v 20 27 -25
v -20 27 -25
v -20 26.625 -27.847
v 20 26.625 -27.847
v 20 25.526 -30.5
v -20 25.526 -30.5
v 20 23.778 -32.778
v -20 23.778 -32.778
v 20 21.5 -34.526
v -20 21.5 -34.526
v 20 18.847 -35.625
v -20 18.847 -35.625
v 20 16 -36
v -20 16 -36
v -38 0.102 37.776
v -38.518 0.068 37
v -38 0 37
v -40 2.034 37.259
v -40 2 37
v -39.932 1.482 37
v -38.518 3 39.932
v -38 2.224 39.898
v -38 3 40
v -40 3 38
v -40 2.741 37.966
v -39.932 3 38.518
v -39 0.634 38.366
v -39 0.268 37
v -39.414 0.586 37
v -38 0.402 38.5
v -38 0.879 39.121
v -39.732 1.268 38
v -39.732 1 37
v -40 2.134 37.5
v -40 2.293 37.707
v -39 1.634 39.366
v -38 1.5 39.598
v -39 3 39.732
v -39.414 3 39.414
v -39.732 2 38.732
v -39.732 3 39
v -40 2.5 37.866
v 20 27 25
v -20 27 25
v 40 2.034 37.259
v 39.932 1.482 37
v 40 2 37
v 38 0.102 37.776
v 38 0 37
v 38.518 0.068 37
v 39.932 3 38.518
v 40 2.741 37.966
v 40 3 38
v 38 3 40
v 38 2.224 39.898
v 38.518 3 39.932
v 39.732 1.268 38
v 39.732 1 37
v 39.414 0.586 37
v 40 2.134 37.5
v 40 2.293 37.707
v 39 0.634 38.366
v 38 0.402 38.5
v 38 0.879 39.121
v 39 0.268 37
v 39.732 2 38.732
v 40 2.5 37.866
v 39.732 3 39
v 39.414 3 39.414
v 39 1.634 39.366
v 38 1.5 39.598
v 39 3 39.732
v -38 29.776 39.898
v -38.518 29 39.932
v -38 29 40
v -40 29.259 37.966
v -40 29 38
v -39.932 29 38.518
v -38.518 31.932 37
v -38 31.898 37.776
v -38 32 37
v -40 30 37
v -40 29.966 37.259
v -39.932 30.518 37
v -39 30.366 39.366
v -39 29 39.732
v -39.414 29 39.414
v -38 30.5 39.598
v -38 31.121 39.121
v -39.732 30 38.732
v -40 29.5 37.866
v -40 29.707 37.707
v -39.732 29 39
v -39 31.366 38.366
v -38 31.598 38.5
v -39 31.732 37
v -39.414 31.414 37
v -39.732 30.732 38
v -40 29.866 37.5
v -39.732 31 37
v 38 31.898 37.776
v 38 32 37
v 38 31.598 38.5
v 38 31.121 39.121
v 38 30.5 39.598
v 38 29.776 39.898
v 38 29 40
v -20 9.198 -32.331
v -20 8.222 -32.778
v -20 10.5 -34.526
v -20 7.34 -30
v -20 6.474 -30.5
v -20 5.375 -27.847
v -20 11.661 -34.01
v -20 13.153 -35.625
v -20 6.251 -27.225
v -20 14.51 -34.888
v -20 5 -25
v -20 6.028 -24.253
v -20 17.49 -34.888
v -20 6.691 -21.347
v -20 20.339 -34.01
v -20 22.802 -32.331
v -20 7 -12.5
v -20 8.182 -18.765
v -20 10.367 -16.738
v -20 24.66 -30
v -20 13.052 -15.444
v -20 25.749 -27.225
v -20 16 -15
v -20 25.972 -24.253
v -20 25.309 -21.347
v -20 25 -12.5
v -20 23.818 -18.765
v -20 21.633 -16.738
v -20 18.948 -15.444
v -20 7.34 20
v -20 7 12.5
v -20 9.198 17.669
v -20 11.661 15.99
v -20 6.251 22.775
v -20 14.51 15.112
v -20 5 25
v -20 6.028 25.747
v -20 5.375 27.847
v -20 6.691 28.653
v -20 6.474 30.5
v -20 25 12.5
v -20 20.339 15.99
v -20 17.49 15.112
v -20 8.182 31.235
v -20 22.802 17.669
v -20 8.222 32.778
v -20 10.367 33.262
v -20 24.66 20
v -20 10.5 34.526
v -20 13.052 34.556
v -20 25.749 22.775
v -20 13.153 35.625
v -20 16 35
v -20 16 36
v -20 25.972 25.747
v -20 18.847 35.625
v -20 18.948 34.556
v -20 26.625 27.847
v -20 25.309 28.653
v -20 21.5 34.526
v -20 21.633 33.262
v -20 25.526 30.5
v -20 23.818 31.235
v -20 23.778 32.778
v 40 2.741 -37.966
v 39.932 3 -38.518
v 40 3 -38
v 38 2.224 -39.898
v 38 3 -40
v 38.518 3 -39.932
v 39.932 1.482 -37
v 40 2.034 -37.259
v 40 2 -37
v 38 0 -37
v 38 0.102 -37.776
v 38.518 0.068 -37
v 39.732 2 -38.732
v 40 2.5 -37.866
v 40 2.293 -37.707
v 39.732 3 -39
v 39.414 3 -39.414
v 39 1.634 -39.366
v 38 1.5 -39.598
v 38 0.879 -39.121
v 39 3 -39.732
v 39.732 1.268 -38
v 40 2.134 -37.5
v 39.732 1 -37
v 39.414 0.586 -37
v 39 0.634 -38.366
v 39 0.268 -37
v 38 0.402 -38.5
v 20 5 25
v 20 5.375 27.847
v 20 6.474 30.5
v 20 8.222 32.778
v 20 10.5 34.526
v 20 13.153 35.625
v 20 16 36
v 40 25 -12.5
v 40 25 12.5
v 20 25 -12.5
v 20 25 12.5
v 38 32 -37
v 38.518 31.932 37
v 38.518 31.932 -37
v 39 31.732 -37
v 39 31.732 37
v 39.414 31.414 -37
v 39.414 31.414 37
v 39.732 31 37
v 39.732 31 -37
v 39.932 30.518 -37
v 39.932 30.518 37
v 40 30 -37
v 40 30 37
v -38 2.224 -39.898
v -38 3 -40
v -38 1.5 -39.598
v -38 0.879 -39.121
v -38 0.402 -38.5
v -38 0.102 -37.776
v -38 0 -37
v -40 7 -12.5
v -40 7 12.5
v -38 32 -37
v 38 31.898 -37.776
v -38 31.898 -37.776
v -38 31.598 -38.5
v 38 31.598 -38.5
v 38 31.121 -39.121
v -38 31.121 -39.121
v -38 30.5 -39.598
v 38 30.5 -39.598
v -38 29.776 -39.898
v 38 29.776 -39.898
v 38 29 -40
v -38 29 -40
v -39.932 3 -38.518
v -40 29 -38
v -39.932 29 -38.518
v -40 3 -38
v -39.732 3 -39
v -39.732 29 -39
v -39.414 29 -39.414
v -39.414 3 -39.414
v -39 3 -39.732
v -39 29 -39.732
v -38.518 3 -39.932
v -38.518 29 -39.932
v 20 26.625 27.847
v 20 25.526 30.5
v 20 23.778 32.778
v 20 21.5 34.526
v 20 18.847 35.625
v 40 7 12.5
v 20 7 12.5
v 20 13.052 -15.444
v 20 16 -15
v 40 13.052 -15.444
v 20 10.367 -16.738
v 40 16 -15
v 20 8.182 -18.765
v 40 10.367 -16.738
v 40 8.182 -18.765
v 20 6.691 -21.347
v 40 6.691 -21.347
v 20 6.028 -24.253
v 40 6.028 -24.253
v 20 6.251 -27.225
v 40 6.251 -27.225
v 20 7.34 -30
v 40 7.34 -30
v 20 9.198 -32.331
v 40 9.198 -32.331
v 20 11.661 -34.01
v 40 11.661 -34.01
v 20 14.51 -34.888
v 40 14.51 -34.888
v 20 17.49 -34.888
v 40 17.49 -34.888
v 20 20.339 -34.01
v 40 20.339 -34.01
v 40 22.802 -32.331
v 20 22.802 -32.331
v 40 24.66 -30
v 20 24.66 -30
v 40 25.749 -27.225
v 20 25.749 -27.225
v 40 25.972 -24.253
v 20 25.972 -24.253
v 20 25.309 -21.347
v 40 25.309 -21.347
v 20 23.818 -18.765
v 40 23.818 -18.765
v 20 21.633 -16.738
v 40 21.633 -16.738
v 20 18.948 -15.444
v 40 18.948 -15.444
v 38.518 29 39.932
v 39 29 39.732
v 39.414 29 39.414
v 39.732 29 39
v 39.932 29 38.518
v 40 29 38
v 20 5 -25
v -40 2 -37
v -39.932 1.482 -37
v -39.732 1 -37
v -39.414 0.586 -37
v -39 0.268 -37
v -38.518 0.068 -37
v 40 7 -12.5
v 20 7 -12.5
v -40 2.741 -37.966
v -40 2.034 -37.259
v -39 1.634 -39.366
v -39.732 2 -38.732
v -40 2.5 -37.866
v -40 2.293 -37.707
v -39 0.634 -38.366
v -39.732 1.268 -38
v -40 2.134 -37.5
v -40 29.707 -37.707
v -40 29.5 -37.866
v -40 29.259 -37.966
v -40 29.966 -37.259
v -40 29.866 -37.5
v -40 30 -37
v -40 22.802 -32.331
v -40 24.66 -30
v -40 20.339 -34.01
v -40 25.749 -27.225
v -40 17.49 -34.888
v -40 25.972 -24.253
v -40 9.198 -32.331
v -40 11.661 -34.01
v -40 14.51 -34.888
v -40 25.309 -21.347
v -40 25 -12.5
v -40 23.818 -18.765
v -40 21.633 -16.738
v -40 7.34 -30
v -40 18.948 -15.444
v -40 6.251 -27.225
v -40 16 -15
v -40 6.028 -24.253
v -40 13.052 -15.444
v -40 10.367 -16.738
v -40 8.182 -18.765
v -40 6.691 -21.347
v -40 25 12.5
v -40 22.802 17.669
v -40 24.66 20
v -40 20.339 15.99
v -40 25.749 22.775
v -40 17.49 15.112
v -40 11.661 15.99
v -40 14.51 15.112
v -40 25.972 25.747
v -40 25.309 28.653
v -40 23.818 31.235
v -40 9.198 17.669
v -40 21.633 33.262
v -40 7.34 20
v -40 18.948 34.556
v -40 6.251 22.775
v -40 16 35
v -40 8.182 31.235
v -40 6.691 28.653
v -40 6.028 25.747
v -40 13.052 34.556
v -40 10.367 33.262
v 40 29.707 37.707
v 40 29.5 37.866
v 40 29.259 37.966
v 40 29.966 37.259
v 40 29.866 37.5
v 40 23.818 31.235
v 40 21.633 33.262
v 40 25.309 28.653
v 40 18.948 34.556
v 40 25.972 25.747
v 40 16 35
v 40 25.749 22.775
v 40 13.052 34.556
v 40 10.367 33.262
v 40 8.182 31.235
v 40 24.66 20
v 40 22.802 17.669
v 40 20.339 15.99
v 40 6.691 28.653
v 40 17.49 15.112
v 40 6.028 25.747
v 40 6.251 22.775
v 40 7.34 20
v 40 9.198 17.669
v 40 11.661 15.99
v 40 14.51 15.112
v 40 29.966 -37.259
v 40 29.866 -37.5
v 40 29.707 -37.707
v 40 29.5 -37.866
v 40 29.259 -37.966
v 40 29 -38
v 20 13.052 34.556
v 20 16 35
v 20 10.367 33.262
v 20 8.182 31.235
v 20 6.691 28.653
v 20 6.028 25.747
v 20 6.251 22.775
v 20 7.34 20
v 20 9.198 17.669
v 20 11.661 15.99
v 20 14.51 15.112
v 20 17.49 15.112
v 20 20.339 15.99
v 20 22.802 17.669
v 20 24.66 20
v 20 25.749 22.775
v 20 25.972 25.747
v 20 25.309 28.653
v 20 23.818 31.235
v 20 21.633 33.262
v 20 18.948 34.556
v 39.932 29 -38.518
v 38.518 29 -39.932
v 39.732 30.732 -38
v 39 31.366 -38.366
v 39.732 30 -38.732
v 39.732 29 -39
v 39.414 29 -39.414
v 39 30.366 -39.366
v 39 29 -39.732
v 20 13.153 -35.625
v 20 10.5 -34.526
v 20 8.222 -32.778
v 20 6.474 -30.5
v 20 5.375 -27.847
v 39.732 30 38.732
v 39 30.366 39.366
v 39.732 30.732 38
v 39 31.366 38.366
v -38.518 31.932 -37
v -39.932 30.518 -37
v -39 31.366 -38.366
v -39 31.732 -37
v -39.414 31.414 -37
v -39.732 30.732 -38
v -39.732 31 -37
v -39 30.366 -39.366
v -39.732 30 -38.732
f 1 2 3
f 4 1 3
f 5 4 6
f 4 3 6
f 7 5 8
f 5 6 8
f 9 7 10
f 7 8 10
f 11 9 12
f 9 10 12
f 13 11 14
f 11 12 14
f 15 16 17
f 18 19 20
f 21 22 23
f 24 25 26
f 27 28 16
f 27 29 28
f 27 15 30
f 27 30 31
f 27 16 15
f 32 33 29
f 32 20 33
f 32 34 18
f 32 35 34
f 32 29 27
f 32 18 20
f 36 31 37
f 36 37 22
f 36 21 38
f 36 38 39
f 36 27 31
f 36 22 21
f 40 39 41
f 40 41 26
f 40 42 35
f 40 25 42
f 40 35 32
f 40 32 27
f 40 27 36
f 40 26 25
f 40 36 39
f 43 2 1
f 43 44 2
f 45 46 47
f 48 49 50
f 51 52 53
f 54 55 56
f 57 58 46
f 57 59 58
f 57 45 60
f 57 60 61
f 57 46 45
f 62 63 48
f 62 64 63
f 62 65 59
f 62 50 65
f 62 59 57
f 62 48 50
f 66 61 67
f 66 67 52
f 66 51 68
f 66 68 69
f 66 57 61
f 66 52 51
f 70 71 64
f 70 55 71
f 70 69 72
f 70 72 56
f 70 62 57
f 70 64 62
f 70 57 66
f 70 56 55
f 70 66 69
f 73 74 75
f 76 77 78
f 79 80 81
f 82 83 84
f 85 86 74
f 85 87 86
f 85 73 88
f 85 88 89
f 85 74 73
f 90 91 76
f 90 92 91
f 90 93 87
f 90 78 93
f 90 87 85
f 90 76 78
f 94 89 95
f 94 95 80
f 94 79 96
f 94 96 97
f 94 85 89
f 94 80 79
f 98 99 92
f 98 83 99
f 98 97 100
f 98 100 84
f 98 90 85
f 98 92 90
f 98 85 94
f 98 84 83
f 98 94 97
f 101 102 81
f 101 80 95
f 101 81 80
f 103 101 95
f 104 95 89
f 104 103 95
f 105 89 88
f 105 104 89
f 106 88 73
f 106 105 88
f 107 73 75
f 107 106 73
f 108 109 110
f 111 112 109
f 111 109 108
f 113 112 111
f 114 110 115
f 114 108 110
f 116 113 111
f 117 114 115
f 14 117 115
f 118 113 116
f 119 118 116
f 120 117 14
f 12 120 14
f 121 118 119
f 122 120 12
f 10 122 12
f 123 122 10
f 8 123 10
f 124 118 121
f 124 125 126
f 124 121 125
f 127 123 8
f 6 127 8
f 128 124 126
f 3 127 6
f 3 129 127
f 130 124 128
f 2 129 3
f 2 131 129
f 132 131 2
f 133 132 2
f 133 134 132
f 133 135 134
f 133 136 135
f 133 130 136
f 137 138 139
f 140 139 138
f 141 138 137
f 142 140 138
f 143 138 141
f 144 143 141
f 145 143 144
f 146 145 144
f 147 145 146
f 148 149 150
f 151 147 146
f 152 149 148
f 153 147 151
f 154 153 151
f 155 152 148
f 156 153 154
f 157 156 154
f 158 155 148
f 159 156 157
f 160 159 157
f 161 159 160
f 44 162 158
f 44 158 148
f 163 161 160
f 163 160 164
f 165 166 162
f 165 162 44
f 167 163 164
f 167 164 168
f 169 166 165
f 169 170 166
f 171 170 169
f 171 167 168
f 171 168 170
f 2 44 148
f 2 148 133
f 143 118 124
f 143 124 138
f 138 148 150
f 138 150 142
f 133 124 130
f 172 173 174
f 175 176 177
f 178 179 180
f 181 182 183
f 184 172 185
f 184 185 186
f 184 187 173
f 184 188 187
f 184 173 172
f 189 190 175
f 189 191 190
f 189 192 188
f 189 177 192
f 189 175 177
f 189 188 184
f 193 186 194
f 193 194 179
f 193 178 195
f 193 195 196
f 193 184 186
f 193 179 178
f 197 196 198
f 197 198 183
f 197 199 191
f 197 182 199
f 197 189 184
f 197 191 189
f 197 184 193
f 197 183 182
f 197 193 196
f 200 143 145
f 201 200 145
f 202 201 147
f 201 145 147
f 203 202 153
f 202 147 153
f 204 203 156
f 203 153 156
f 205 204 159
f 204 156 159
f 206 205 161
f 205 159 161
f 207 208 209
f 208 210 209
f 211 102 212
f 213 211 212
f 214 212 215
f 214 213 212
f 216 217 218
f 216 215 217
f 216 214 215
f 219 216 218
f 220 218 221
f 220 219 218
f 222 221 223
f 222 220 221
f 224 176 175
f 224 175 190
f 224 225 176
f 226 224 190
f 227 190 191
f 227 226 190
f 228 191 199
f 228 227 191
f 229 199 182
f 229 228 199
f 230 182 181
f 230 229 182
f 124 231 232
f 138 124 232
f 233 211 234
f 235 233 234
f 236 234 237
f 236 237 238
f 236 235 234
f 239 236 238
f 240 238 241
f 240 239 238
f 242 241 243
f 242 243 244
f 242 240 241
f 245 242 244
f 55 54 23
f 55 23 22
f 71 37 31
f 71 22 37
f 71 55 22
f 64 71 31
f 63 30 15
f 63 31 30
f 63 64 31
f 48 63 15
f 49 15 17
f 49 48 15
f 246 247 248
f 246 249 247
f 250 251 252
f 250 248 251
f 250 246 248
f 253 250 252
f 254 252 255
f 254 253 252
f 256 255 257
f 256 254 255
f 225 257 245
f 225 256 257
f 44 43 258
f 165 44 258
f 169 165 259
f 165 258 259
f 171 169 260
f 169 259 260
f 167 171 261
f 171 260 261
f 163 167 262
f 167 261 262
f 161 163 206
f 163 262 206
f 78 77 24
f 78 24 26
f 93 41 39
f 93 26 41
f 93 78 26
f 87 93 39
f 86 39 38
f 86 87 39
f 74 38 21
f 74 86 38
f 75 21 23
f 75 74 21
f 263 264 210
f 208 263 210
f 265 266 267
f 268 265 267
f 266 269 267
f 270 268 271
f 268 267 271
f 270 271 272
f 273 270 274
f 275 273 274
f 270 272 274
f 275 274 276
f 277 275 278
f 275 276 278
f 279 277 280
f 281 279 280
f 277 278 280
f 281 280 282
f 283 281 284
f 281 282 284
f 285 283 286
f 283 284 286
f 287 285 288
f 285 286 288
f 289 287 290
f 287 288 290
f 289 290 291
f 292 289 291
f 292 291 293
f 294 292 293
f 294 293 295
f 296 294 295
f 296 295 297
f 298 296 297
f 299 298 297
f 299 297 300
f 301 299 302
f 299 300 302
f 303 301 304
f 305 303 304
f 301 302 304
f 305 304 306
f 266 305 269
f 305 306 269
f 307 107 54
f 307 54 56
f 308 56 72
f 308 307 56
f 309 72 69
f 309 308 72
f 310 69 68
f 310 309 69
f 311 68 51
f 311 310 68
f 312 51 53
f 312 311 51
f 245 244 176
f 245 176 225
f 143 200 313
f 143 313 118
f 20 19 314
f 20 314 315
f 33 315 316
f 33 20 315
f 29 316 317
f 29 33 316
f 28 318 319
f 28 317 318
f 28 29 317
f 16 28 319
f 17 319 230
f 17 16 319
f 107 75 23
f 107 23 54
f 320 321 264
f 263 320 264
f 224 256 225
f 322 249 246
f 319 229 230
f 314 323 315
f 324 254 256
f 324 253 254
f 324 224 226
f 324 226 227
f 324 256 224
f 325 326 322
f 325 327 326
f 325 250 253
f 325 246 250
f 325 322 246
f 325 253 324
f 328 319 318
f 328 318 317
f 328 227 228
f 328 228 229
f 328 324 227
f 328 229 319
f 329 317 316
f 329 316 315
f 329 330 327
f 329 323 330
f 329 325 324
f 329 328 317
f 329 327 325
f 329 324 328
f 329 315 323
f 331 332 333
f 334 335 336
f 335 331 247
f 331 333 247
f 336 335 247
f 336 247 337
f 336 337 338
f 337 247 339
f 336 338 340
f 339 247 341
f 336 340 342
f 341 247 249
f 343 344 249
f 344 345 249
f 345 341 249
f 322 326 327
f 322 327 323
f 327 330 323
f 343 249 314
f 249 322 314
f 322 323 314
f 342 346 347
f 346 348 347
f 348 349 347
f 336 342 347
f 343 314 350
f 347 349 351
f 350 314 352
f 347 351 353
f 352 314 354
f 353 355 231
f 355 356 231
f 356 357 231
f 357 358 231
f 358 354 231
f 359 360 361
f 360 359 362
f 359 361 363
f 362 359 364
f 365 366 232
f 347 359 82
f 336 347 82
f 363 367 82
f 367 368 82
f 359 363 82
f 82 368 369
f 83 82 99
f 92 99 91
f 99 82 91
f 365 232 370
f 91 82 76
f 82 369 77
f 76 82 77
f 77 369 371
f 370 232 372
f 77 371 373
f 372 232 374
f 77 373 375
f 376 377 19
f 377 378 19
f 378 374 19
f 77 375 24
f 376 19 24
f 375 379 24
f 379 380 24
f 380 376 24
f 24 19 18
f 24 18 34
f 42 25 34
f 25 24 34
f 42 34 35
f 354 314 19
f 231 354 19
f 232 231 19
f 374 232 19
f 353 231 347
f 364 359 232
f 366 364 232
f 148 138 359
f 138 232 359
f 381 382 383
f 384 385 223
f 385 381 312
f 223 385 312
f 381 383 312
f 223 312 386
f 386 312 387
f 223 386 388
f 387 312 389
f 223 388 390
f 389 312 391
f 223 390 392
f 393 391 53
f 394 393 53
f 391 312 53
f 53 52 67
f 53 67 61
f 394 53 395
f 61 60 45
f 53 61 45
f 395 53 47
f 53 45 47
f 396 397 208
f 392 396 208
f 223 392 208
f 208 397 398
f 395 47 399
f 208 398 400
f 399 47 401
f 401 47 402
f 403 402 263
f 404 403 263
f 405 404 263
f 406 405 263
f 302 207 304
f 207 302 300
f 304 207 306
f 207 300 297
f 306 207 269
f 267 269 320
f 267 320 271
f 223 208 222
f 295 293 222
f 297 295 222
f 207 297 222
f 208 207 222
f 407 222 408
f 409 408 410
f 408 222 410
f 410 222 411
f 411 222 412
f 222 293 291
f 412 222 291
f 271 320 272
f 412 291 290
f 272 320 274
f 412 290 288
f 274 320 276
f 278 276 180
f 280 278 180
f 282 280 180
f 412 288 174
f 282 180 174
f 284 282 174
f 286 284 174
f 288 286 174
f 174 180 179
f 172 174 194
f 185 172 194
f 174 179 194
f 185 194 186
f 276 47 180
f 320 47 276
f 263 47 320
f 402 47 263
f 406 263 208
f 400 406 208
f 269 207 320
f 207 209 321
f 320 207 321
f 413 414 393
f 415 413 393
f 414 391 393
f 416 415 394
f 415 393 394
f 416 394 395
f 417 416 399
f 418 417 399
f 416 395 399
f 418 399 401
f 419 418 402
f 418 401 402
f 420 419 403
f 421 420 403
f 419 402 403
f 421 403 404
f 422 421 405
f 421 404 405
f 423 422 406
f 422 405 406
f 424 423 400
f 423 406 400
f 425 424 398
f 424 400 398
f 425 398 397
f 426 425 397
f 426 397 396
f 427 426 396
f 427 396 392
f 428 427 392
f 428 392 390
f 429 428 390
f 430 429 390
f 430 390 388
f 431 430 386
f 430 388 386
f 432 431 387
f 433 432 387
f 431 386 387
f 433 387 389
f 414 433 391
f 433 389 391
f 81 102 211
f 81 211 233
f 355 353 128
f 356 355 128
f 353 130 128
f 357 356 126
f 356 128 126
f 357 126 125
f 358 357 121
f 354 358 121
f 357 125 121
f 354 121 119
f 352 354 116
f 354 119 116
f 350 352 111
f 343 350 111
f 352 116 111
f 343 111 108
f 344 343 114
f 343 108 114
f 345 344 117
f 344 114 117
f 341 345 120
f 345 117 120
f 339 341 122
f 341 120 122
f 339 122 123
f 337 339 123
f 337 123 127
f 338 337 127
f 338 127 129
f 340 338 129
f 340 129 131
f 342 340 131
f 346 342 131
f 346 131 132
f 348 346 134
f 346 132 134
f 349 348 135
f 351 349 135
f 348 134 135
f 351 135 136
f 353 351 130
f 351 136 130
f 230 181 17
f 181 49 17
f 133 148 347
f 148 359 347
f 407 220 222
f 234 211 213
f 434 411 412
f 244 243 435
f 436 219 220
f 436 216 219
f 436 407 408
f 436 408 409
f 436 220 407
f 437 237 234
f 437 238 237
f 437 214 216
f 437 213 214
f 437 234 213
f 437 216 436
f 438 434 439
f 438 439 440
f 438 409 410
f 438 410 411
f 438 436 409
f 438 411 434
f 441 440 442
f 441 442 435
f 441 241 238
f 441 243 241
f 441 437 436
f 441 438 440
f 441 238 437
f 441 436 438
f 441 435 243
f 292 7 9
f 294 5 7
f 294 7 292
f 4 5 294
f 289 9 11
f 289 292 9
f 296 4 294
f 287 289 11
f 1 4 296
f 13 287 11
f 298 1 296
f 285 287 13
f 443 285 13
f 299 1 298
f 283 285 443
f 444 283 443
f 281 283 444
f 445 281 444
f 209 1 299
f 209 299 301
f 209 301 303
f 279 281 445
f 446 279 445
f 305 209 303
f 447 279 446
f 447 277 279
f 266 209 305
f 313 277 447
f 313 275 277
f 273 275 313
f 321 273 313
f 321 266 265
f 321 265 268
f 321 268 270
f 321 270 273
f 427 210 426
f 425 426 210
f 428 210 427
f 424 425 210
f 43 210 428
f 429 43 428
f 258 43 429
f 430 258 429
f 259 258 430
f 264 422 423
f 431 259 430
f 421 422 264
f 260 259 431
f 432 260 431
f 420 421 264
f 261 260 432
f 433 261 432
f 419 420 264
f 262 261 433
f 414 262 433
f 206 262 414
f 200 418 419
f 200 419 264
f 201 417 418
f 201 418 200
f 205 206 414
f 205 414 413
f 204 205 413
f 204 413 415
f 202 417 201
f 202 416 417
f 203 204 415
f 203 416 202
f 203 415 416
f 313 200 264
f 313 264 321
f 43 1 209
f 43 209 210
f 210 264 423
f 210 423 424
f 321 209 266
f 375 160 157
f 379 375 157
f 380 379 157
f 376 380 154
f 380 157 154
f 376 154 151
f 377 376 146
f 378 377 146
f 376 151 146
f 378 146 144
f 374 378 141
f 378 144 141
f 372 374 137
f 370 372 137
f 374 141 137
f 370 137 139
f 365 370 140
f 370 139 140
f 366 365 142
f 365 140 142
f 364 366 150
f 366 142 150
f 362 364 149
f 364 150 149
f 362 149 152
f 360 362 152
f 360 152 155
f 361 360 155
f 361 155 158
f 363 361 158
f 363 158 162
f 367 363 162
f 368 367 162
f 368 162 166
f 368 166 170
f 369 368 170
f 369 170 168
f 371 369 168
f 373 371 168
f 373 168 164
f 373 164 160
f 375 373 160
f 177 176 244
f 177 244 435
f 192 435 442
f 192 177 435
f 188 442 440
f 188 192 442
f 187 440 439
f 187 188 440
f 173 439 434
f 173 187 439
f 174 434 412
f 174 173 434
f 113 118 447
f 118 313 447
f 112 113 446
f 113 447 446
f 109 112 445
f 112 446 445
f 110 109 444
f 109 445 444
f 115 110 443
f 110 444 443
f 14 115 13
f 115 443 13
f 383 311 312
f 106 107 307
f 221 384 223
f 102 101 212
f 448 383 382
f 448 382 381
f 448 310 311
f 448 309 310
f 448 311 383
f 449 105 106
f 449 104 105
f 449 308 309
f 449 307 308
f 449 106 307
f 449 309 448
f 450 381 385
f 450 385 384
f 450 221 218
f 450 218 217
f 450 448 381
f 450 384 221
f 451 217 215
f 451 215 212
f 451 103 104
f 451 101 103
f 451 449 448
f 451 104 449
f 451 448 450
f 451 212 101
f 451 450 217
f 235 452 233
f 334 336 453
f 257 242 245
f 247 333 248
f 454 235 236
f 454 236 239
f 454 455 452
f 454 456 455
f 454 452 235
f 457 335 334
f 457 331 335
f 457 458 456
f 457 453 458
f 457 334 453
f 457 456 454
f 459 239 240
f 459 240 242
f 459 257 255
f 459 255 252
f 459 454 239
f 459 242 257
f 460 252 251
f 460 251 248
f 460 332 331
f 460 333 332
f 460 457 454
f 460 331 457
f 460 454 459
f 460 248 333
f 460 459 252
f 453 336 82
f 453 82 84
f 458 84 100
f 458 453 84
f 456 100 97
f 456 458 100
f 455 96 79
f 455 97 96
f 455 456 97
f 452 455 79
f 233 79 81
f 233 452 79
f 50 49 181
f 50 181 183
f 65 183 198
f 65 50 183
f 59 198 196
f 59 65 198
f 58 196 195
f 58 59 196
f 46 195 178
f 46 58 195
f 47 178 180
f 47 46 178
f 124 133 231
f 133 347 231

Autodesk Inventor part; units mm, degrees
ref_plane "YZ Plane" through (0, 0, 0) normal (1, 0, 0) x (0, 1, 0)
ref_plane "XZ Plane" through (0, 0, 0) normal (0, 1, 0) x (-1, 0, 0)
ref_plane "XY Plane" through (0, 0, 0) normal (0, 0, 1) x (1, 0, 0)
sketch "Sketch1" plane through (0, 0, 0) normal (0, 1, 0) x (-1, 0, 0)
  line L0 (40, 40) -> (-40, 40)
  line L1 (-40, 40) -> (-40, -40)
  line L2 (-40, -40) -> (40, -40)
  line L3 (40, -40) -> (40, 40)
  point P0 (0, 0)
  point P1 (40, 0)
  point P2 (0, 40)
  dimension "d0" = 80
  dimension "d1" = 80
extrude "Extrusion1" add sketch "Sketch1" along normal blind 32
sketch "Sketch27" plane through (-40, 0, 40) normal (0, 0, 1) x (1, 0, 0)
  line L0 (20, 27) -> (60, 27)
  line L1 (60, 27) -> (60, 5)
  line L2 (60, 5) -> (20, 5)
  line L3 (20, 5) -> (20, 27)
  line L4 (0, 0) -> (80, 0) projected
  line L5 (0, 32) -> (80, 32) projected
  line L6 (0, 0) -> (0, 32) projected
  line L7 (80, 0) -> (80, 32) projected
  point P0 (40, 0)
  dimension "d171" = 5
  dimension "d172" = 5
  dimension "d173" = 20
  dimension "d174" = 20
extrude "Extrusion21" cut sketch "Sketch27" against normal up to next contours L0 L1 L2 L3
sketch "Sketch28" plane through (-40, 0, -40) normal (-1, 0, 0) x (0, 0, 1)
  line L0 (0, 0) -> (0, 32) projected
  point P0 (40, 0)
  point P1 (15, 16)
  point P2 (65, 16)
  point P3 (0, 16)
  point P4 (0, 16)
  dimension "d177" = 25
  dimension "d178" = 25
hole "Hole8" at (-40, 16, -25) at (-40, 16, 25) direction (1, 0, 0) diameter 20 end through all
sketch "Sketch29" plane through (-40, 0, -40) normal (-1, 0, 0) x (0, 0, 1)
  line L0 (52.5, 25) -> (27.5, 25)
  line L1 (27.5, 25) -> (27.5, 7)
  line L2 (27.5, 7) -> (52.5, 7)
  line L3 (52.5, 7) -> (52.5, 25)
  line L4 (0, 32) -> (80, 32) projected
  line L5 (0, 0) -> (80, 0) projected
  point P0 (40, 0)
  point P1 (40, 7)
  point P2 (40, 0)
  dimension "d186" = 7
  dimension "d187" = 7
  dimension "d188" = 25
extrude "Extrusion22" cut sketch "Sketch29" against normal through all
extrude "Extrusion23" add sketch "Sketch27" against normal blind 4 contours L0 L1 L2 L3
sketch "Sketch30" plane through (40, 0, -40) normal (0, 0, -1) x (-1, 0, 0)
  line L0 (20, 27) -> (60, 27) projected
  line L1 (60, 5) -> (20, 5)
  line L2 (20, 5) -> (20, 27)
  line L3 (20, 27) -> (60, 27)
  line L4 (60, 27) -> (60, 5)
  point P0 (40, 0)
extrude "Extrusion24" add sketch "Sketch30" against normal blind 4
fillet "Fillet23" radius 11 4 edges at (0, 5, -36) (0, 27, -36) (0, 27, 36) (0, 5, 36)
fillet "Fillet24" radius 3 4 edges at (0, 32, 40) (0, 0, 40) (0, 32, -40) (0, 0, -40)
fillet "Fillet25" radius 2 16 edges at (40, 31.1213, -39.1213) (40, 16, -40) (40, 0.8787, -39.1213) (40, 0, 0) (40, 0.8787, 39.1213) (40, 16, 40) (40, 31.1213, 39.1213) (40, 32, 0) (-40, 31.1213, 39.1213) (-40, 16, 40) (-40, 0.8787, 39.1213) (-40, 0, 0) (-40, 0.8787, -39.1213) (-40, 16, -40) (-40, 31.1213, -39.1213) (-40, 32, 0)
properties part number "Y_Slider_Part_mit_Schrittmotor"
